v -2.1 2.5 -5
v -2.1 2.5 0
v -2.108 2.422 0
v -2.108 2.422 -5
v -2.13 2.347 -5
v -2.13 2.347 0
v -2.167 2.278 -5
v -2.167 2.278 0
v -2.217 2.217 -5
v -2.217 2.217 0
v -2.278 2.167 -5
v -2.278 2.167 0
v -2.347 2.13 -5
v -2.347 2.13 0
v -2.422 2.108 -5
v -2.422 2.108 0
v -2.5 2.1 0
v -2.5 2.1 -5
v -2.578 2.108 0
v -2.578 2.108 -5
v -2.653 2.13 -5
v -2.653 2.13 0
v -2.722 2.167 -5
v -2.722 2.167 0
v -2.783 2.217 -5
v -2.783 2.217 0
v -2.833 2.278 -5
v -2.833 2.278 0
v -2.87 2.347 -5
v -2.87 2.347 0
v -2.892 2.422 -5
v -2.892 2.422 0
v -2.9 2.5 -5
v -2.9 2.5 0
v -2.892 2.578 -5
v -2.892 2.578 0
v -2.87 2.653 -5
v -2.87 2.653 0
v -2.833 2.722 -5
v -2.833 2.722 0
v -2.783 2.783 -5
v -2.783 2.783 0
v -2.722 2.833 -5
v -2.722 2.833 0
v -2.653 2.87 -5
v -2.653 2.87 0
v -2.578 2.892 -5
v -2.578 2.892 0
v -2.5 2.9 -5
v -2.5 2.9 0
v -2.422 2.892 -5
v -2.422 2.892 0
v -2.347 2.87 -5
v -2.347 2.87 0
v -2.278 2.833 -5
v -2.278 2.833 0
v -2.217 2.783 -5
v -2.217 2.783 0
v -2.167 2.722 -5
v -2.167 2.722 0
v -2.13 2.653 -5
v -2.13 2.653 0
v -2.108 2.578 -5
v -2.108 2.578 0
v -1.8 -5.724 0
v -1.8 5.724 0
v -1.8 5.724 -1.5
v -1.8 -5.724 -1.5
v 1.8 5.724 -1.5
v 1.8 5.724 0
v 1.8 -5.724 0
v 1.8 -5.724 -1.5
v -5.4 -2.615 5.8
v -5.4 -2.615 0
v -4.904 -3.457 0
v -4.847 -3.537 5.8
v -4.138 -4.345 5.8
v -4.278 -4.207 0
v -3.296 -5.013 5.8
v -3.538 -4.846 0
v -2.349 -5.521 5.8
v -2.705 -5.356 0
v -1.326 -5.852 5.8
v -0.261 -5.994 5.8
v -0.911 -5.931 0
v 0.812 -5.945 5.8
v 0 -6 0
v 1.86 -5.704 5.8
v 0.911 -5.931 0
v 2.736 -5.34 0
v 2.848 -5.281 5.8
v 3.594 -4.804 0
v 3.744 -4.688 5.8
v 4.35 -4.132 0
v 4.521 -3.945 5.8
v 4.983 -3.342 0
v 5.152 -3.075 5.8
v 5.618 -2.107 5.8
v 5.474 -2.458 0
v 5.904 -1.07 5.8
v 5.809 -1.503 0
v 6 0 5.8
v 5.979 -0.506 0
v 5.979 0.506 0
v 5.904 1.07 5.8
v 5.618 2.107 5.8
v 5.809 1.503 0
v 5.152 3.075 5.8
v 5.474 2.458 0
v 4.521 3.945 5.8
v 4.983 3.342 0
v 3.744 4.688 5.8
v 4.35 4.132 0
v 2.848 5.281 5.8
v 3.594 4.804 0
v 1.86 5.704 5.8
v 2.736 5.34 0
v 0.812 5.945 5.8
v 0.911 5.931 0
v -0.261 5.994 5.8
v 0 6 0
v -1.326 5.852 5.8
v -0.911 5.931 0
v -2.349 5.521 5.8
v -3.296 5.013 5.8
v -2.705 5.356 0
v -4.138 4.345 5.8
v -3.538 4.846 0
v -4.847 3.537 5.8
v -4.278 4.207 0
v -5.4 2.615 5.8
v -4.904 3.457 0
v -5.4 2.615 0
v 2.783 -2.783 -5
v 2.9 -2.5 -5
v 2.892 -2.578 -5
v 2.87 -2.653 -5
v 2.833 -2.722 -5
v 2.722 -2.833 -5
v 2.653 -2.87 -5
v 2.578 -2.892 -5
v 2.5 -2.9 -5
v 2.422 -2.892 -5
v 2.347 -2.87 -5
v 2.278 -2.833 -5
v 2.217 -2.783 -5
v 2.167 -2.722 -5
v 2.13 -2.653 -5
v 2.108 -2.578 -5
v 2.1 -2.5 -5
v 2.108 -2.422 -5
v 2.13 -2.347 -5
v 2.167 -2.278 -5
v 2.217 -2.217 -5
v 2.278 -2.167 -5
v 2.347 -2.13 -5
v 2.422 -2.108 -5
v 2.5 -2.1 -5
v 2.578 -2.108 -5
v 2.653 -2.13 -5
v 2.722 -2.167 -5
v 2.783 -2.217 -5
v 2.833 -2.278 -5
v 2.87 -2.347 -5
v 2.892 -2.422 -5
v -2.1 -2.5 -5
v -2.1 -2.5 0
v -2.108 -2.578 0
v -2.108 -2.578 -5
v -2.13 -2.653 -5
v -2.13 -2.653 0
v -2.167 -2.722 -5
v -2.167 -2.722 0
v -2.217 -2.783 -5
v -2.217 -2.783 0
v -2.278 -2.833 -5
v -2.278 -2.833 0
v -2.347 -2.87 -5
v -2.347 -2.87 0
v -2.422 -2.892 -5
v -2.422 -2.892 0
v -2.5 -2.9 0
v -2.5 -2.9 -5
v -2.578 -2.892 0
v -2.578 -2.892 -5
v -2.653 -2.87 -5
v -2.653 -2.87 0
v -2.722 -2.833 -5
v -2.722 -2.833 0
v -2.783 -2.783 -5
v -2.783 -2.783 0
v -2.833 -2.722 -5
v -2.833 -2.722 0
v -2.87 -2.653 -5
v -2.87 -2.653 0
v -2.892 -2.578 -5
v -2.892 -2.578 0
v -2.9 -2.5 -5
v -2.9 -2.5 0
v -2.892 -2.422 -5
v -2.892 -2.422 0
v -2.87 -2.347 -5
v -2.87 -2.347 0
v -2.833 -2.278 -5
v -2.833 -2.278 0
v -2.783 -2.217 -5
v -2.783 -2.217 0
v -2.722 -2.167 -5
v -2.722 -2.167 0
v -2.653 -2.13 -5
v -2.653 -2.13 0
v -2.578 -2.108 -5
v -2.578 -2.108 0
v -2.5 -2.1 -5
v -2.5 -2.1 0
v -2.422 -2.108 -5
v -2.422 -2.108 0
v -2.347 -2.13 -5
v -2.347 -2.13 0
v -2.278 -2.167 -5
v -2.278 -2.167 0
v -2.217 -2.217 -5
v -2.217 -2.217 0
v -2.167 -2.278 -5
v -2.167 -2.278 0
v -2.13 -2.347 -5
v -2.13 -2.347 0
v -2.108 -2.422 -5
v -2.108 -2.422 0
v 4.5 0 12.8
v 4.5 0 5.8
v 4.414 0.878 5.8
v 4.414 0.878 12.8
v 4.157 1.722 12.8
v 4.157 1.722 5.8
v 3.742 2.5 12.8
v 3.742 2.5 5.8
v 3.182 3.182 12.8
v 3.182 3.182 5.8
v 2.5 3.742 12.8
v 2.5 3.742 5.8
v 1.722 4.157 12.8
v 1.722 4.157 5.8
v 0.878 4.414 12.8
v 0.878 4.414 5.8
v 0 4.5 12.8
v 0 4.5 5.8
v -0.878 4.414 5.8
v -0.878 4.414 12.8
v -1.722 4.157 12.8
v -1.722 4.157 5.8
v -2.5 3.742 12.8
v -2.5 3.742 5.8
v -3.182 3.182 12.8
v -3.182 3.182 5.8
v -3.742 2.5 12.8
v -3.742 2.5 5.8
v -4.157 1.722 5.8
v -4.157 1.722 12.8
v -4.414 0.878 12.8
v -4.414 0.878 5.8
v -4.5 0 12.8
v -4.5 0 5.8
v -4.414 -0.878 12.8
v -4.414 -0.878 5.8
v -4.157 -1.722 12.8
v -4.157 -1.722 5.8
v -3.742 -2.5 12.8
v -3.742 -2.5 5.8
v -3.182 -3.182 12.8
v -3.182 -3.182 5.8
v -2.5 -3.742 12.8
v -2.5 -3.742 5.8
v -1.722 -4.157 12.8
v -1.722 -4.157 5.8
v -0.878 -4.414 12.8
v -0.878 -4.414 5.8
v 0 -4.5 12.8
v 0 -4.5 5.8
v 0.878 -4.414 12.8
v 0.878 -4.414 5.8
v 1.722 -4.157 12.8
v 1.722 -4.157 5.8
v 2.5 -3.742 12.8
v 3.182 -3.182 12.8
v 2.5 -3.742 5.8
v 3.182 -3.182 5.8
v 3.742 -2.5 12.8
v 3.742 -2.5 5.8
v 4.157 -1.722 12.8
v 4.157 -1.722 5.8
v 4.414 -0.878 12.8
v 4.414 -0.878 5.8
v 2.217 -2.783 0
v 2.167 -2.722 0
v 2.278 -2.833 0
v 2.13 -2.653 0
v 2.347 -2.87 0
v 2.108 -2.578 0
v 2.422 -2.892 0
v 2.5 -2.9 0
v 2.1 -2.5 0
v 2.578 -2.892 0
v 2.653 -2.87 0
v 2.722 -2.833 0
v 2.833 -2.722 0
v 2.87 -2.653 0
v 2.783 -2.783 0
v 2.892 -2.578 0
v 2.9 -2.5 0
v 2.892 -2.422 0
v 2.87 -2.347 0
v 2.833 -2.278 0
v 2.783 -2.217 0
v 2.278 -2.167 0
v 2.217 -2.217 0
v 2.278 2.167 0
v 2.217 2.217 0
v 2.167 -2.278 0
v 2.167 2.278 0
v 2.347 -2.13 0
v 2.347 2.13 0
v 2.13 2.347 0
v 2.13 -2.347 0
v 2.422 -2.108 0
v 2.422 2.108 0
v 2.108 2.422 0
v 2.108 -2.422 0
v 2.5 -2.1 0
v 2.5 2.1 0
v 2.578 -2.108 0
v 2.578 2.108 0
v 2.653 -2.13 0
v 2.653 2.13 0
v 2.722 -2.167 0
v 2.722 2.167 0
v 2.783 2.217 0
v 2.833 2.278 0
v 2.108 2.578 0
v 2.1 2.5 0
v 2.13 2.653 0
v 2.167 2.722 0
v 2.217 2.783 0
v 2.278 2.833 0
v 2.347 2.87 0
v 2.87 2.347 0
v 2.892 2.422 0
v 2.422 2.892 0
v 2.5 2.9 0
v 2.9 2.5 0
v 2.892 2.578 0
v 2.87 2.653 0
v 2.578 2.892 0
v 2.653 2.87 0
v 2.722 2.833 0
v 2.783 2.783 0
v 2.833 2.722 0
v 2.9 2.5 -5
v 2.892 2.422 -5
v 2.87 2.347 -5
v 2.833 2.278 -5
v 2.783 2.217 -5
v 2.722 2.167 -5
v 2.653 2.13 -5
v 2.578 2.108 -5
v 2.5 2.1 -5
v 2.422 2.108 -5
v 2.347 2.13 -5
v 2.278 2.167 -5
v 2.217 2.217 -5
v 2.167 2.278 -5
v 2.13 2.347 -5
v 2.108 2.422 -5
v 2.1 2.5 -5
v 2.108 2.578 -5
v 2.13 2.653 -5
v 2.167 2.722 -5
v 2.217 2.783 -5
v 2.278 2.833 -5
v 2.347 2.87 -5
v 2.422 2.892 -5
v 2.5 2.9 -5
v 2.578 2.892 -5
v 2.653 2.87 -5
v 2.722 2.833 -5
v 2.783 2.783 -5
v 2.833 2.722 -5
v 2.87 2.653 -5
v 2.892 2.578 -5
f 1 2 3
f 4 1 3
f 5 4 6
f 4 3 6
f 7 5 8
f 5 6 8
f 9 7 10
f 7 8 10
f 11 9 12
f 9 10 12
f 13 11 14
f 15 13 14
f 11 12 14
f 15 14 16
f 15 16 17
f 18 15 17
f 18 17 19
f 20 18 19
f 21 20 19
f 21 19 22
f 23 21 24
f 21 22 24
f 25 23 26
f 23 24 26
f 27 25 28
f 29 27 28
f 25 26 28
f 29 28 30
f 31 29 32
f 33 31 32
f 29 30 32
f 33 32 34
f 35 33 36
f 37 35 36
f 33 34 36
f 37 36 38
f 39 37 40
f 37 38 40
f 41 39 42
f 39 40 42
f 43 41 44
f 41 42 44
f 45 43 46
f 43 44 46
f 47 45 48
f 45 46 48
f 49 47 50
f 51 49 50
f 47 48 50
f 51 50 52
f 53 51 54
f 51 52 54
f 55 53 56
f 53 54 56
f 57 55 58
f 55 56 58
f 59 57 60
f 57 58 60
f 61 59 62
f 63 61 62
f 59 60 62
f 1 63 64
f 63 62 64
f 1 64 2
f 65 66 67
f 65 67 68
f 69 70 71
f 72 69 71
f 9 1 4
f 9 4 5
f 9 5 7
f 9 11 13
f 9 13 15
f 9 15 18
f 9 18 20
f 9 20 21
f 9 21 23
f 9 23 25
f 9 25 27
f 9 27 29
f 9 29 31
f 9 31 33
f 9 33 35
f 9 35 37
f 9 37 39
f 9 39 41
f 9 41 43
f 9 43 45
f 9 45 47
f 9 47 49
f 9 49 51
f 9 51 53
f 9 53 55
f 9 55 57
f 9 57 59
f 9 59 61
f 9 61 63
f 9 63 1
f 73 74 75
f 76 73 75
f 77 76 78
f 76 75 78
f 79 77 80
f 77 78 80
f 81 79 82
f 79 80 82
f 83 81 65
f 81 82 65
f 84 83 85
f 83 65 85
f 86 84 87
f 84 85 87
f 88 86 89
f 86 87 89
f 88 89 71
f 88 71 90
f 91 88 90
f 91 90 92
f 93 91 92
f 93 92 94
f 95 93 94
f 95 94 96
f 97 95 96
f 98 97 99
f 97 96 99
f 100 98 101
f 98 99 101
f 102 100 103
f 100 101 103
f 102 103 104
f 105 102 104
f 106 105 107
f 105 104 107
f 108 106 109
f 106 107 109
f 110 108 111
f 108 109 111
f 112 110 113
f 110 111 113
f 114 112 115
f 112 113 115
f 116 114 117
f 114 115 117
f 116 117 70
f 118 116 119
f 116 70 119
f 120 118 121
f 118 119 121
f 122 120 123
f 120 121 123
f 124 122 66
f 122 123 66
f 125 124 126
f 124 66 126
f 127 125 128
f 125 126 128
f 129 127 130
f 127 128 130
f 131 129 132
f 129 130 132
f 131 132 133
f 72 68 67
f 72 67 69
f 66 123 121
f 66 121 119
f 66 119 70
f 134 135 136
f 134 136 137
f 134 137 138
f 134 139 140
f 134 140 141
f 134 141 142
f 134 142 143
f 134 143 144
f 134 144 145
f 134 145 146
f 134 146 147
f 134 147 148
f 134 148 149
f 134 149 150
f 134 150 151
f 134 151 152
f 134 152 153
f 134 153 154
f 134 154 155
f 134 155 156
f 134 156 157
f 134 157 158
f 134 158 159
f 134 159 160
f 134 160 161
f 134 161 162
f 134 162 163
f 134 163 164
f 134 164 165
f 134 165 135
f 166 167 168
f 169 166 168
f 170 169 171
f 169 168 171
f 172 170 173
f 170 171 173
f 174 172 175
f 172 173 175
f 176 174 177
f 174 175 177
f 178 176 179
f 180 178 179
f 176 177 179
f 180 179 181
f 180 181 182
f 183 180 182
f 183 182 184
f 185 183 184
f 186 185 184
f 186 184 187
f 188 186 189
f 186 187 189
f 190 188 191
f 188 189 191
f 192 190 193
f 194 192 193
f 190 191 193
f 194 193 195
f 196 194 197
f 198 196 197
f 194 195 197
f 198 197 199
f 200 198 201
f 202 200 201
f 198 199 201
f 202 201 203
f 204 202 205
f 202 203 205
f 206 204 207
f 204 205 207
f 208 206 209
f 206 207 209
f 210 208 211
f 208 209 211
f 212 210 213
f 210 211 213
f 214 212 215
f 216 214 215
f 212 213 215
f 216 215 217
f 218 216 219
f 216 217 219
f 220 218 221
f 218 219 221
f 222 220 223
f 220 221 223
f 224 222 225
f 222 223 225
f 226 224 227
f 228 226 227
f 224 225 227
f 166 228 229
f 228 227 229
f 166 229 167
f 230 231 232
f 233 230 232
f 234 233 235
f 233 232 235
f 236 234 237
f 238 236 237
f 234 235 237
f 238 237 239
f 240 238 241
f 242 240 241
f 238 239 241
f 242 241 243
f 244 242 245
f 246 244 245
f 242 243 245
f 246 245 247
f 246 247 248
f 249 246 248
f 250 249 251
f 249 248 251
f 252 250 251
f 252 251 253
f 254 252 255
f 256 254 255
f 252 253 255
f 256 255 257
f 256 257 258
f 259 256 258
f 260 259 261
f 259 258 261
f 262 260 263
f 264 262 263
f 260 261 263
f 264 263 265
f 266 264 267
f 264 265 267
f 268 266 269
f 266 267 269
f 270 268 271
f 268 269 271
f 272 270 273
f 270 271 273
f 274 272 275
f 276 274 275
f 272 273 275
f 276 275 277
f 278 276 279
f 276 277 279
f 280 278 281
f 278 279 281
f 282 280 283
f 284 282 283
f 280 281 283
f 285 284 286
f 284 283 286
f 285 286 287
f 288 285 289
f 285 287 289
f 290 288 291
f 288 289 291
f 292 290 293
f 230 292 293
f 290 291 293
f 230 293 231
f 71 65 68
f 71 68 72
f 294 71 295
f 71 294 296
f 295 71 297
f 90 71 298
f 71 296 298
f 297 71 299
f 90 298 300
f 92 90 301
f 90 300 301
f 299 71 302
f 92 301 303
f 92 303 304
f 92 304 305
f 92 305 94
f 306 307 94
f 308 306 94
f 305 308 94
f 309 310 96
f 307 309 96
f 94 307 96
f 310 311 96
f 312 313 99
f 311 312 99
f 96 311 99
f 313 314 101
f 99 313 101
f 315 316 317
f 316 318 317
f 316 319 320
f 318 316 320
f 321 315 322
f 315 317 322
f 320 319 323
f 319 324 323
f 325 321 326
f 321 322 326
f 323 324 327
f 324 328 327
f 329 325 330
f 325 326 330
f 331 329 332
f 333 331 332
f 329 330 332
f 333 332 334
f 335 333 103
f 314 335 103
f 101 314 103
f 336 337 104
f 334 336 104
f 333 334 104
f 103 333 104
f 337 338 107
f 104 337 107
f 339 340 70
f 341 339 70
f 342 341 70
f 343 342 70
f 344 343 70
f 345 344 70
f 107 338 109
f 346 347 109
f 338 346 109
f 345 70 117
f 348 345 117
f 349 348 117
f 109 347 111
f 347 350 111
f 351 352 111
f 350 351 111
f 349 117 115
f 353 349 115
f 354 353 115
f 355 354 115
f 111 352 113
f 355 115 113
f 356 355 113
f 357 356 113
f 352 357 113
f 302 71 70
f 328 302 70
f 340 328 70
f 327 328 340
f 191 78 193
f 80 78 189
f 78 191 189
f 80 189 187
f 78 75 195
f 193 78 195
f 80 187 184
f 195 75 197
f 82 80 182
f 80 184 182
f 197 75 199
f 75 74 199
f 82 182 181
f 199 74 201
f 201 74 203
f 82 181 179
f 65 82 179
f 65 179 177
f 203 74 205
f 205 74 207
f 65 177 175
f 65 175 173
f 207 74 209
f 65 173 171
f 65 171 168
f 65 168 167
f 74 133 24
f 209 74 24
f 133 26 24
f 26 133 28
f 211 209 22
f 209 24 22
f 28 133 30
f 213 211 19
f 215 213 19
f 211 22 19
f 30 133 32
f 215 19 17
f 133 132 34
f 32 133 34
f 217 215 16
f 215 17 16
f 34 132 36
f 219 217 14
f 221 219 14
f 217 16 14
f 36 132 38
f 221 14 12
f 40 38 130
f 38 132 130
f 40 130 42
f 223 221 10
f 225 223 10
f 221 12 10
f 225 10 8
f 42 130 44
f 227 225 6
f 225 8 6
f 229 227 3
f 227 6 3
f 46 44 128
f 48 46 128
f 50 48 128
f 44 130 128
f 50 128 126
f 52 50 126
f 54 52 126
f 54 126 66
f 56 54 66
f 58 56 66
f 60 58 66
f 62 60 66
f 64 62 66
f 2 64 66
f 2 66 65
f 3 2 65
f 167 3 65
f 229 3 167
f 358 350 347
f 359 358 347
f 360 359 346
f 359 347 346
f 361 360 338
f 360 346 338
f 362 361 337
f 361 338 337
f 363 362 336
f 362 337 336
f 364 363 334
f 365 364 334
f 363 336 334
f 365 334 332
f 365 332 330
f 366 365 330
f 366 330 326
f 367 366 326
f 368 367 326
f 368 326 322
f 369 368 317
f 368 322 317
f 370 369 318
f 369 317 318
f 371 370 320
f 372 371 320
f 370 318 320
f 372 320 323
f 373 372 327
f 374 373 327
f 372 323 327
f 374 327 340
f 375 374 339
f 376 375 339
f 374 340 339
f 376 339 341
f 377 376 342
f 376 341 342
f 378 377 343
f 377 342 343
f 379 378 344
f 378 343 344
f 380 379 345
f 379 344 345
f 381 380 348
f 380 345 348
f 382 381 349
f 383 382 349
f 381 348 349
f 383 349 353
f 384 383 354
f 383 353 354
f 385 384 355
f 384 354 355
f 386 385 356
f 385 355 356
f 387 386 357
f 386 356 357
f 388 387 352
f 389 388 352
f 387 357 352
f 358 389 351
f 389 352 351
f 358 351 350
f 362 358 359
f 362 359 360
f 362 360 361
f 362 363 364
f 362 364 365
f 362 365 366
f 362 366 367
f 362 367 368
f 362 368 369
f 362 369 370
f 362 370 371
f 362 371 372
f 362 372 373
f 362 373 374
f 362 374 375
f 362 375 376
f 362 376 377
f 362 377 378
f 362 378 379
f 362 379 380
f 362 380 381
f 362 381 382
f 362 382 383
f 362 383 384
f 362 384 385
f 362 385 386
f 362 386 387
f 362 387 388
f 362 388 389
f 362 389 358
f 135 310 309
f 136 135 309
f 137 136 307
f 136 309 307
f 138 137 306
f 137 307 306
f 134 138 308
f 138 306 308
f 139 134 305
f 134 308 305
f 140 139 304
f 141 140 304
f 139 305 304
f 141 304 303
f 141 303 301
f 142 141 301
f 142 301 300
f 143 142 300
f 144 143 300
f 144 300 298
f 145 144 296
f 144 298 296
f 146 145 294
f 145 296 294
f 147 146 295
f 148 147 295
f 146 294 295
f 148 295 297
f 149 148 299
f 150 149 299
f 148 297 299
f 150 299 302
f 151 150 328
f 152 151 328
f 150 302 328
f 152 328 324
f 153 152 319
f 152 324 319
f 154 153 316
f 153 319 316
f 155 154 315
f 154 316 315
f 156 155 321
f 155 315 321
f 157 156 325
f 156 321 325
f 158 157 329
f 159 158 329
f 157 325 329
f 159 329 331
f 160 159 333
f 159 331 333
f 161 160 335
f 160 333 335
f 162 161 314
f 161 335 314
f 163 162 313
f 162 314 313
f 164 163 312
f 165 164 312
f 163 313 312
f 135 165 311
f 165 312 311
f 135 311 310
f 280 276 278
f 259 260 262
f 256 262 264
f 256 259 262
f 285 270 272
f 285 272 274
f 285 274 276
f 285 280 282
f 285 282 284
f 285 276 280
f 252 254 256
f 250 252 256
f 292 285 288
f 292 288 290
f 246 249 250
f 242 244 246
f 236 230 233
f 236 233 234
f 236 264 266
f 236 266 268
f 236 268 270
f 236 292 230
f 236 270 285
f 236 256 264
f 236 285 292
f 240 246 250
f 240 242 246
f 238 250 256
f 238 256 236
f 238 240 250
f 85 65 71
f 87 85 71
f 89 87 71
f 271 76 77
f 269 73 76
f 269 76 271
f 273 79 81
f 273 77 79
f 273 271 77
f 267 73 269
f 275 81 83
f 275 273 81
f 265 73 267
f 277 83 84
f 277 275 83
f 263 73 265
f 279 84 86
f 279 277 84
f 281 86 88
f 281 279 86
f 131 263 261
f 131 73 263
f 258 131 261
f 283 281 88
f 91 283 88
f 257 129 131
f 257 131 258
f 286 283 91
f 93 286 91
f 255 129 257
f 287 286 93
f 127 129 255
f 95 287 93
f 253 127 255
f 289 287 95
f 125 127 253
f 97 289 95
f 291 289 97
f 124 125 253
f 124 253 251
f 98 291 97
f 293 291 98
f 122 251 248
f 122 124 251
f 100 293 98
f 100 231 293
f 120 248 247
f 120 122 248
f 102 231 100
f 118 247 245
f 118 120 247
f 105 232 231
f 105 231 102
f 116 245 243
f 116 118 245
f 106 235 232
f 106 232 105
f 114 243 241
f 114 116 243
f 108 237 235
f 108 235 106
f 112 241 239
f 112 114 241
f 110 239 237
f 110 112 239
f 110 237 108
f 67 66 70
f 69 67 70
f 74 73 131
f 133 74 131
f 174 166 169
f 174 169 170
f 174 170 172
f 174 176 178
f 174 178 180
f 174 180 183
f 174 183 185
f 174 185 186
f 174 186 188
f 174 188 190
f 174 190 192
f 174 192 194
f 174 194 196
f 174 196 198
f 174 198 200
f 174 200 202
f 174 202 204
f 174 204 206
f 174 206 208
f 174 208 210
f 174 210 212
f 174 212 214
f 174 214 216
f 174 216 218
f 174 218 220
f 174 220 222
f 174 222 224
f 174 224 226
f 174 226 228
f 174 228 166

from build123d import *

# Parameters (mm, degrees)
SKETCH_R     = 6
PAD_DEPTH    = 5.8
SKETCH001_R  = 4.5
PAD001_DEPTH = 7
SKETCH002_W  = 0.6
SKETCH002_H  = 12
POCKET_DEPTH = 6
SKETCH003_R  = 0.4
PAD002_DEPTH = 5
SKETCH004_W  = 3.6
SKETCH004_H  = 11.44727
PAD003_DEPTH = 1.5


with BuildPart() as part:
    # Sketch → Pad (new body)
    with BuildSketch(Plane.XY):
        Circle(SKETCH_R)
    extrude(amount=PAD_DEPTH)

    # Sketch001 → Pad001 (new body)
    with BuildSketch(Plane.XY.offset(5.8)):
        Circle(SKETCH001_R)
    extrude(amount=PAD001_DEPTH)

    # Sketch002 → Pocket (cut)
    with BuildSketch(Plane.XY.offset(5.8)):
        with Locations((-5.7, 0)):
            Rectangle(SKETCH002_W, SKETCH002_H)
    extrude(amount=-POCKET_DEPTH, mode=Mode.SUBTRACT)

    # Sketch003 → Pad002 (new body)
    with BuildSketch(Plane(origin=(0, 0, 0), x_dir=(1, 0, 0), z_dir=(0, 0, -1))):
        with Locations((-2.5, 2.5)):
            Circle(SKETCH003_R)
        with Locations((2.5, 2.5)):
            Circle(SKETCH003_R)
        with Locations((-2.5, -2.5)):
            Circle(SKETCH003_R)
        with Locations((2.5, -2.5)):
            Circle(SKETCH003_R)
    extrude(amount=PAD002_DEPTH)

    # Sketch004 → Pad003 (new body)
    with BuildSketch(Plane(origin=(0, 0, 0), x_dir=(1, 0, 0), z_dir=(0, 0, -1))):
        Rectangle(SKETCH004_W, SKETCH004_H)
    extrude(amount=PAD003_DEPTH)


solid = part.part
